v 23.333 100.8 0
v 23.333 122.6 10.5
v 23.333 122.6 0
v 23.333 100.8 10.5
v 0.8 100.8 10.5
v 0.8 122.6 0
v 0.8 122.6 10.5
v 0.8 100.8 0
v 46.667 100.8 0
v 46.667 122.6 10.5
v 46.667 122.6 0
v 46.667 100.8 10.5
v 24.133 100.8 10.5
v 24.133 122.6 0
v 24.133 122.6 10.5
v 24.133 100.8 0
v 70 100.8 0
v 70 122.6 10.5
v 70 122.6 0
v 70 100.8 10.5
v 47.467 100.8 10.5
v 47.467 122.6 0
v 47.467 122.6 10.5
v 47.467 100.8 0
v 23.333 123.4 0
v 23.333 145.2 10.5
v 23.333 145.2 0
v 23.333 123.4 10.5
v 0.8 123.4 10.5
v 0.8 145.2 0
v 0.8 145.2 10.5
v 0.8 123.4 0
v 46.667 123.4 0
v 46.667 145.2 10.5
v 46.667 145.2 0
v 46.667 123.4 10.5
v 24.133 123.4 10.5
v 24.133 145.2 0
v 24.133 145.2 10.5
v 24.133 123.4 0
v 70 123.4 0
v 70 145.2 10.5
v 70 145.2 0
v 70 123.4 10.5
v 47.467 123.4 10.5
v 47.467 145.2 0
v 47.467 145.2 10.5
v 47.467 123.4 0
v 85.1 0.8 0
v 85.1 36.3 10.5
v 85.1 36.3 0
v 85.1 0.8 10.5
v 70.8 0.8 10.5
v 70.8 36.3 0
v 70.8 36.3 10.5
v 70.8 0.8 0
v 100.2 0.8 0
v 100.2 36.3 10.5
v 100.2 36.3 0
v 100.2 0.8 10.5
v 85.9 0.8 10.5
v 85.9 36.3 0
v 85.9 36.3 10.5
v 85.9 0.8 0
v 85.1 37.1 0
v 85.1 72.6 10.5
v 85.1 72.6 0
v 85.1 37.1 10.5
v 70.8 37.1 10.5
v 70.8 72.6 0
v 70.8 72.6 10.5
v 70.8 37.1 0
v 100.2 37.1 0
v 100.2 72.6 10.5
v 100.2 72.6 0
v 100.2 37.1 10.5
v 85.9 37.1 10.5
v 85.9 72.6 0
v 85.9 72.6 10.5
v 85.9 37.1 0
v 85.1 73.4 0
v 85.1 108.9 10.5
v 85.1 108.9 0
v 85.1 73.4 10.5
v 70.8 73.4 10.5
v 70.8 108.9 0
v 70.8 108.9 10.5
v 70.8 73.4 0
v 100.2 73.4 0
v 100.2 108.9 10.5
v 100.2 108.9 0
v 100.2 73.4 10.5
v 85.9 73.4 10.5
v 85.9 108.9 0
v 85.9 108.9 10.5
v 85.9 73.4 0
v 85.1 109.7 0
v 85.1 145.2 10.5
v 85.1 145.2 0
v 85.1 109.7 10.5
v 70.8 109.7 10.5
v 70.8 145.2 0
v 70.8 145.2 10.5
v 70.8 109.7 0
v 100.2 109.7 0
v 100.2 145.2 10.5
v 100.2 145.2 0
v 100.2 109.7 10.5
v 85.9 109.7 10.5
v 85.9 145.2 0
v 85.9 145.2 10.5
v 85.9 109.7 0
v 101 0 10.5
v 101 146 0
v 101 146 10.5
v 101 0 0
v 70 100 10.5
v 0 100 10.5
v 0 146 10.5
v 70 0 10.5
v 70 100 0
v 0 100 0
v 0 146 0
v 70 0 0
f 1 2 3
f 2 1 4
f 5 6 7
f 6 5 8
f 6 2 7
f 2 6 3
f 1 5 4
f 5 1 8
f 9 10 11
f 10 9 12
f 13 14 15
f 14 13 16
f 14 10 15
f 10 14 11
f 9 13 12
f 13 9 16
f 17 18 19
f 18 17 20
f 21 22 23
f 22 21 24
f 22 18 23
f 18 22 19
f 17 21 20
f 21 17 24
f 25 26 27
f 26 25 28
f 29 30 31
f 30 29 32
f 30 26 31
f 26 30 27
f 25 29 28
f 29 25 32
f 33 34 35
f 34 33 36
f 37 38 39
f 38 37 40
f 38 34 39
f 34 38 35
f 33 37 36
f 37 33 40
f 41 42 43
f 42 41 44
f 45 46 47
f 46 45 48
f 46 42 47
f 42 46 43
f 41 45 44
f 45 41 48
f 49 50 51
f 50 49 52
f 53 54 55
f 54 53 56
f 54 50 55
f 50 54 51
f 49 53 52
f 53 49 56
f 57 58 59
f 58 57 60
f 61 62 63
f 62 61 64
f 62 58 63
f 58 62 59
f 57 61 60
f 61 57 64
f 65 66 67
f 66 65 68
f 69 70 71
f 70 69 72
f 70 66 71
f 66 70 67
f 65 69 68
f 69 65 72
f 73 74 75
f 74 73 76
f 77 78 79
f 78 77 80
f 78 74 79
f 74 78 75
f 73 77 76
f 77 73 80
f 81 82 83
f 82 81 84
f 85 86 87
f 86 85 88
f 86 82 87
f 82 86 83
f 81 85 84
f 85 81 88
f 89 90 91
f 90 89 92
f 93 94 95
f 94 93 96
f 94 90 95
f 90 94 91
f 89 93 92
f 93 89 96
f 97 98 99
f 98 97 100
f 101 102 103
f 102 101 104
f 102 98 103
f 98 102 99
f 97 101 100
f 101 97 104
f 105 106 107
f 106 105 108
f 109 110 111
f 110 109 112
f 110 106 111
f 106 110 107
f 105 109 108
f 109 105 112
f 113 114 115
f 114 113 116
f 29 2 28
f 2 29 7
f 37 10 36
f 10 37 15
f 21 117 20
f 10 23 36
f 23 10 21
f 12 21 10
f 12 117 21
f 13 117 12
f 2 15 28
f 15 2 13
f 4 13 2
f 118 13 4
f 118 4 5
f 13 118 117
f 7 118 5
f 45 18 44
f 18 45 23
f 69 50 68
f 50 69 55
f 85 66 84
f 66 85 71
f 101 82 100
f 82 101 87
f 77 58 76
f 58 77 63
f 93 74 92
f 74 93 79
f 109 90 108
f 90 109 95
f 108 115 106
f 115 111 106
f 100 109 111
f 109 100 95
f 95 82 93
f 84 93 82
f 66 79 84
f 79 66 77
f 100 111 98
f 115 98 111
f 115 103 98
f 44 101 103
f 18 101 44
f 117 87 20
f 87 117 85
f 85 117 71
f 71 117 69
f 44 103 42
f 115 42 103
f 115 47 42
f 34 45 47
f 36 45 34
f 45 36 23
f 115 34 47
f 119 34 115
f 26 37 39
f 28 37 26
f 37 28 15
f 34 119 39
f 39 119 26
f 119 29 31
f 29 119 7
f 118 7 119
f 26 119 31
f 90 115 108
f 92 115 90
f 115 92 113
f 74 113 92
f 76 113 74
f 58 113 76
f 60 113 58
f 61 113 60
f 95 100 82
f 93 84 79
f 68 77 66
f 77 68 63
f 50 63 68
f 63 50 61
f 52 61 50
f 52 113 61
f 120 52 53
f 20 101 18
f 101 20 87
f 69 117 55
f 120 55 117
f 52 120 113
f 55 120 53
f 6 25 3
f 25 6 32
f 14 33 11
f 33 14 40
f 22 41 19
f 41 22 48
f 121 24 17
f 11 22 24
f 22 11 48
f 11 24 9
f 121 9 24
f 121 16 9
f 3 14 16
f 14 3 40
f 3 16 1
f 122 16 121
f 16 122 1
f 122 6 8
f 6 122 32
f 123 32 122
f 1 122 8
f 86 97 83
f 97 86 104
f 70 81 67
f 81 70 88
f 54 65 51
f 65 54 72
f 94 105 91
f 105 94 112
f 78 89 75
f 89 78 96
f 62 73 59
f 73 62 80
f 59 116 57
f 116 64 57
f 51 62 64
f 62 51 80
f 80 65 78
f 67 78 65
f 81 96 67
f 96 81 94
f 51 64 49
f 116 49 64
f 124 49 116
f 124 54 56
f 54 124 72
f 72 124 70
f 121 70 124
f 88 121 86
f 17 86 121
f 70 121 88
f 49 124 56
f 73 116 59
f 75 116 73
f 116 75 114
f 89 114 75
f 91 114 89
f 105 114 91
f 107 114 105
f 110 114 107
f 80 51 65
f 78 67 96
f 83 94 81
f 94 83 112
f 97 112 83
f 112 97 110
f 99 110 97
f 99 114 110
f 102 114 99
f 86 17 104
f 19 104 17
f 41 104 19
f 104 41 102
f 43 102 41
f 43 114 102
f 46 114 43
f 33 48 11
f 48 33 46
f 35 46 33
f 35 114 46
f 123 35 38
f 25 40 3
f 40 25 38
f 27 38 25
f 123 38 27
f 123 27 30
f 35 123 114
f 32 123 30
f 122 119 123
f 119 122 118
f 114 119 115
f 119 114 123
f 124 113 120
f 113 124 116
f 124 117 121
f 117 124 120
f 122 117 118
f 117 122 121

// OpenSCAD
/*
    Allows a 3.5" hard drive to be placed into my 5.25" removable drive bay.
    I use tape to hold the drive in the sled. It's simple, works very well, and looks a bit naff!
    
    This was one of my first truely useful items printed on my 3D printer,
    and something I couldn't buy in the shops!
*/

wall = 0.8;
drive_size = [70,100,10.5];
sled_size = [101,146, drive_size[2] ];

module chomp( size, across = 1, along = 1 )
{
    w = (size[0] - (wall * (across - 1))) / across;
    d = (size[1] - (wall * (along - 1))) / along;
    
    echo ( w, d );
    
    for ( y = [0 : along-1] ) {
        for ( x = [0 : across-1]) {
            translate( [ x * (w + wall), y * (d + wall), -1 ] )
            cube( [w, d, size[2]+2 ] );
        }
    }
}

module sled_gaps()
{
    translate( [ wall, drive_size[1] + wall, 0 ] )        
    chomp( [ drive_size[0] - wall, sled_size[1] - drive_size[1] - wall * 2, drive_size[2] ], across = 3, along = 2 );

    translate( [ drive_size[0] + wall, wall, 0 ] )
    chomp( [ sled_size[0] - drive_size[0] - wall * 2, sled_size[1] - wall * 2, drive_size[2] ], across = 2, along=4 );
}
    

module sled()
{
    difference() {
        cube( sled_size );
        sled_gaps();
    }
}

module drive()
{
    translate( [-1,-1,-1]) cube( drive_size + [1,1,2] );
}

difference() {
    sled();
    drive();
}
